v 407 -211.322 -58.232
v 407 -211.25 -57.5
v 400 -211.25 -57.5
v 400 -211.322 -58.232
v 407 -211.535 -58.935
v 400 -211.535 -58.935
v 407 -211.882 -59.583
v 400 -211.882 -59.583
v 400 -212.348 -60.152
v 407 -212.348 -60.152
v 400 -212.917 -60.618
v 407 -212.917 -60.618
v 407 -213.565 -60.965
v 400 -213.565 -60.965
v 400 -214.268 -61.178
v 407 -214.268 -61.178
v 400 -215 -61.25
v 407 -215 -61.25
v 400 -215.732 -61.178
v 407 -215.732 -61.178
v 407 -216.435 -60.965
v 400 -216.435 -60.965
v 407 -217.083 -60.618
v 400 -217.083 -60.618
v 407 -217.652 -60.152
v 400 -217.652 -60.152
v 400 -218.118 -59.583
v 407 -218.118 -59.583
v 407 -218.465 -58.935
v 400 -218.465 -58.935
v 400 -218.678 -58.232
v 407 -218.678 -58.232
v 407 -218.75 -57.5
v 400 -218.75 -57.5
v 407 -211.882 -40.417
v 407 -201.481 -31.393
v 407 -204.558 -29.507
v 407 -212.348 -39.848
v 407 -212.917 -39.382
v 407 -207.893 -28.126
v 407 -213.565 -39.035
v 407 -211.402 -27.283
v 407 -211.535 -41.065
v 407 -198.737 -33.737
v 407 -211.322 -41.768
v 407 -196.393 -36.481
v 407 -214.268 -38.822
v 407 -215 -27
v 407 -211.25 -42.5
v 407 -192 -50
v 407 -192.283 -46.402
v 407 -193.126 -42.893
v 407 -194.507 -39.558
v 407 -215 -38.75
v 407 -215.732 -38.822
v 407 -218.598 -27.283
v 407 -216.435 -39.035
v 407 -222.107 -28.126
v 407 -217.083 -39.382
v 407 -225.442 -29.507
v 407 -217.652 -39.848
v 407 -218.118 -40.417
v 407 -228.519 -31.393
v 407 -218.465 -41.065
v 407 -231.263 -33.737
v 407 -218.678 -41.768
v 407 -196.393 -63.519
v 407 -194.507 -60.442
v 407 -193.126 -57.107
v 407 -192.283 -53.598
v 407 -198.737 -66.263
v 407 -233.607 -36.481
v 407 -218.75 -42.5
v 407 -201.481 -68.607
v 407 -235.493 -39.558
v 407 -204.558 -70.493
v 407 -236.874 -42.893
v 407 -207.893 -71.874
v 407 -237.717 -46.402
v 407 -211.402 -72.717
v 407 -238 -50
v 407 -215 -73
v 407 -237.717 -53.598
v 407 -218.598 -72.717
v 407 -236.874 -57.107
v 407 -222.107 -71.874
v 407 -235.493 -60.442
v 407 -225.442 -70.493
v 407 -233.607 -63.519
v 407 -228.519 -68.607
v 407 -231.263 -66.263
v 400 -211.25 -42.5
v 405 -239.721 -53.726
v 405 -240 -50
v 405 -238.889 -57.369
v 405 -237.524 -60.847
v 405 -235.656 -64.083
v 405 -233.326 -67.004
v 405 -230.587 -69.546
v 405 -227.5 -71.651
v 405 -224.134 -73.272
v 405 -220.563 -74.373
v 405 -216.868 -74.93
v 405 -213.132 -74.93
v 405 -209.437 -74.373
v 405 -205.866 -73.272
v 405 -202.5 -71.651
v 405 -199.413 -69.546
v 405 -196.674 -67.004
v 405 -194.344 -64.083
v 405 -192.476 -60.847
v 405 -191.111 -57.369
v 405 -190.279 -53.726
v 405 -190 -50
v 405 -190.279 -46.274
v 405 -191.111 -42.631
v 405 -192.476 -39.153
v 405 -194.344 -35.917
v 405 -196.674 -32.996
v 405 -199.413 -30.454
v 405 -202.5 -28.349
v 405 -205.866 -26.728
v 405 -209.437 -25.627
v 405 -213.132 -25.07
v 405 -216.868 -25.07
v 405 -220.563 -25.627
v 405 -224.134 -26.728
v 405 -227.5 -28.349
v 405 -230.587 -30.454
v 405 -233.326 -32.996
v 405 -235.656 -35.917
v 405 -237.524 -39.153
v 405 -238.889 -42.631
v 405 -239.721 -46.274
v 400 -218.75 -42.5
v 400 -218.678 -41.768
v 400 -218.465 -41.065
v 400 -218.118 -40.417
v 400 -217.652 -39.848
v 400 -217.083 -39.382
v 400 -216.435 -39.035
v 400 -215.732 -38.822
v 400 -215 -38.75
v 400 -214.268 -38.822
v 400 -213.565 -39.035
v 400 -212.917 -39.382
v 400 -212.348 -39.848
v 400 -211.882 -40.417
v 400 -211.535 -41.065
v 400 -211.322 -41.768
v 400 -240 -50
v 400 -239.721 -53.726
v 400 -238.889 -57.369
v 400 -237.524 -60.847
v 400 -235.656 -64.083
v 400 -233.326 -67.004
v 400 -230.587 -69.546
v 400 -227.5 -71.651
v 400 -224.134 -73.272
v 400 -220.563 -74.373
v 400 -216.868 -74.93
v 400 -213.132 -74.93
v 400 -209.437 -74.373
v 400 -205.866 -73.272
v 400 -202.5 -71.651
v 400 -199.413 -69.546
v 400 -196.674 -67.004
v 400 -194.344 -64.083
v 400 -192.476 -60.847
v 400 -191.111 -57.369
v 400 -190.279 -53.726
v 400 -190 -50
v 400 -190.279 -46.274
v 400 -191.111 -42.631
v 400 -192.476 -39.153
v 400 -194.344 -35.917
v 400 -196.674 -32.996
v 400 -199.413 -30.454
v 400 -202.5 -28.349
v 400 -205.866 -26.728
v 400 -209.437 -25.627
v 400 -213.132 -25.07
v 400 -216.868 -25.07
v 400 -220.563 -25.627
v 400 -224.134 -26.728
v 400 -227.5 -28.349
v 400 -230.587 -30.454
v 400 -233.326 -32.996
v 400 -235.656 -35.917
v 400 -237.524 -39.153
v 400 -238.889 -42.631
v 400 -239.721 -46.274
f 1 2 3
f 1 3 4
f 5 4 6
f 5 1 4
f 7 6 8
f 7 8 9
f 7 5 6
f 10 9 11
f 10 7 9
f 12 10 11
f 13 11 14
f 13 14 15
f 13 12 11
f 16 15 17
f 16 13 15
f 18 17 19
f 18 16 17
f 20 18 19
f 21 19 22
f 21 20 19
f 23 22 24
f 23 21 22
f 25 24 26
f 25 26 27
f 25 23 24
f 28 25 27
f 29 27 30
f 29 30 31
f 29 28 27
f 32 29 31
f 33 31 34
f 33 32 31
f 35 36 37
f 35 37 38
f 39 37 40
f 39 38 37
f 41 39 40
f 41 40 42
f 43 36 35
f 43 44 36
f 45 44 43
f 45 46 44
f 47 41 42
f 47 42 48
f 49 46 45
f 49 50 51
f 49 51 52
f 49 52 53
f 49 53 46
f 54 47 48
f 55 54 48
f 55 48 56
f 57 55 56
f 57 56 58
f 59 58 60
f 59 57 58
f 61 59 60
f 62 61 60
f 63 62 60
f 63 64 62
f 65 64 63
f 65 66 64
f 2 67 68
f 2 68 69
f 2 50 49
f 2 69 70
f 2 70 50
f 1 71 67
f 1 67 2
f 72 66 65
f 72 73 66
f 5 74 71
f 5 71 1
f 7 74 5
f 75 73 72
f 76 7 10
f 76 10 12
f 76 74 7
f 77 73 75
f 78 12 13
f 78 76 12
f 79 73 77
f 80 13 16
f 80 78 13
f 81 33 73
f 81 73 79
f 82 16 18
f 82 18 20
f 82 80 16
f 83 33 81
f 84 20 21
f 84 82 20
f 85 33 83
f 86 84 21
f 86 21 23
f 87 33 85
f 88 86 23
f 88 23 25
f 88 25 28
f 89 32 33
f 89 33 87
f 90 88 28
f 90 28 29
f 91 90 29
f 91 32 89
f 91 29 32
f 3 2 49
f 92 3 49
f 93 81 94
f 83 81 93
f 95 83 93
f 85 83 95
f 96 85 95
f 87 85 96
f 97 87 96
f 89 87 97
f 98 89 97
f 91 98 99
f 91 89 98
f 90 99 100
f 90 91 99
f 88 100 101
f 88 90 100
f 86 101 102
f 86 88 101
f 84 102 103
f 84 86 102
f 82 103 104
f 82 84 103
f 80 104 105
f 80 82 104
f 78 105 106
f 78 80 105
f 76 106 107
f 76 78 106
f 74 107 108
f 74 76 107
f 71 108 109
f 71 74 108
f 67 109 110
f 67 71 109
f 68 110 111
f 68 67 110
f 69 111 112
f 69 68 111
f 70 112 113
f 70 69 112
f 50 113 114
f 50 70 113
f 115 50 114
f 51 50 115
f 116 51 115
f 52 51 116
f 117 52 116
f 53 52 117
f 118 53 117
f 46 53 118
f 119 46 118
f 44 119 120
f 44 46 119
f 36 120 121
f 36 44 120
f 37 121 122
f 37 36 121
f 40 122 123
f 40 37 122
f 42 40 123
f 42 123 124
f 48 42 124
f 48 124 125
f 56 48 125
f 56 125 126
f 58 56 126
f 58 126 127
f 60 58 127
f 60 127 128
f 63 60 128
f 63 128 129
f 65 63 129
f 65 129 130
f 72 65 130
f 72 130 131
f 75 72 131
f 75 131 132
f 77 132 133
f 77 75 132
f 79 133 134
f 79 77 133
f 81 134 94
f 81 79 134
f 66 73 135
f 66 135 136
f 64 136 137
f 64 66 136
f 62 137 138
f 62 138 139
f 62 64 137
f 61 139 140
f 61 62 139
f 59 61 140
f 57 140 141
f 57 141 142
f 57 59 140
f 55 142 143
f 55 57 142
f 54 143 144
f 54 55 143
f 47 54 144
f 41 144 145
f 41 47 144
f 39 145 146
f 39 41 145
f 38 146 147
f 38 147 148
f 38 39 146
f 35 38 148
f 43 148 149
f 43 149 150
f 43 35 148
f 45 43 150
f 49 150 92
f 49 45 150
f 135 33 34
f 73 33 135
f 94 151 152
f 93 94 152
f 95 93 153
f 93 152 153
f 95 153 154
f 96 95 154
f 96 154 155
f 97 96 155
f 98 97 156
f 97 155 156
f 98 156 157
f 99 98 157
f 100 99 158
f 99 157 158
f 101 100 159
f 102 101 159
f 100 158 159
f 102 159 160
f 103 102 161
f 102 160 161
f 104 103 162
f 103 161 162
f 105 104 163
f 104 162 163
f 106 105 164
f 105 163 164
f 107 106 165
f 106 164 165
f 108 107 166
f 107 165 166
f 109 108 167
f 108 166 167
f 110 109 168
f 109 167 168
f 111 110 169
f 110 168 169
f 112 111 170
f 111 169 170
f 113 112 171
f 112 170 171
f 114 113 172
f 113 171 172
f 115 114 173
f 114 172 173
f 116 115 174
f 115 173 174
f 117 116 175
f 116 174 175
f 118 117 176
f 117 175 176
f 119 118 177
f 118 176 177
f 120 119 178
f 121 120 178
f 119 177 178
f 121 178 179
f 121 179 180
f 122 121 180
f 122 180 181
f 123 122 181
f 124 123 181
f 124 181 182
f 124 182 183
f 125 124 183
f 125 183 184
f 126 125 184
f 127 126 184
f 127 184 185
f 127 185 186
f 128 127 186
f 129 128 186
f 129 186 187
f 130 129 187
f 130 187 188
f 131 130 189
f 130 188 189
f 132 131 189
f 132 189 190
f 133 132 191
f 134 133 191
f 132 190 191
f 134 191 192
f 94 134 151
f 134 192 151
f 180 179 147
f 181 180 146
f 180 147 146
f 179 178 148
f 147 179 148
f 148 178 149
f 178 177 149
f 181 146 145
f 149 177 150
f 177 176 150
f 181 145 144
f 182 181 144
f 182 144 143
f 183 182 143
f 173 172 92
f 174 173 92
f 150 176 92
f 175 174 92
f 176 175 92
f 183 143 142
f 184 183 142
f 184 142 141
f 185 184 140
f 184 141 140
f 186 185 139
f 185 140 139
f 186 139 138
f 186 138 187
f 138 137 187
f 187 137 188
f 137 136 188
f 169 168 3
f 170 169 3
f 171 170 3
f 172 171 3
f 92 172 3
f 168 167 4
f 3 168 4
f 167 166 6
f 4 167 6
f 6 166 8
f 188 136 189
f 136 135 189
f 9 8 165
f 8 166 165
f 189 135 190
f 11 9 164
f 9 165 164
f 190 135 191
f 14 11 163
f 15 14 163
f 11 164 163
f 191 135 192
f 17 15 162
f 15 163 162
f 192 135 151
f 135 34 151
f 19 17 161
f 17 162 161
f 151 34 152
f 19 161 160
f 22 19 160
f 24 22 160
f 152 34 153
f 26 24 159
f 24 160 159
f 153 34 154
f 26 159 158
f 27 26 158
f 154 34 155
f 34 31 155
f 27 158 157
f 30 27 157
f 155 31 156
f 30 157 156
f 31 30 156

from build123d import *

# Parameters (mm, degrees)
EXTRUDE020_DEPTH         = 10
CIRCLE002_R              = 25
EXTRUDE019_DEPTH         = 7
CHAMFER002_SIZE          = 2
CLONE033_ROLL_ANGLE      = 180
CLONE033_PLACEMENT_ANGLE = -90


with BuildPart() as extrude020:
    # Sketch030 (on Face4 of Chamfer002) → Extrude020 (new body, symmetric)
    with BuildSketch(Plane(origin=(0, 7, 0), x_dir=(-1, 0, 0), z_dir=(0, 1, 0))):
        with BuildLine():
            ThreePointArc((3.75, 7.5), (0, 11.25), (-3.75, 7.5))
            Line((-3.75, 7.5), (-3.75, -7.5))
            ThreePointArc((-3.75, -7.5), (0, -11.25), (3.75, -7.5))
            Line((3.75, 7.5), (3.75, -7.5))
        make_face()
    extrude(amount=EXTRUDE020_DEPTH, both=True)


with BuildPart() as lock_right_external:
    # Circle002 → Extrude019 (new body)
    with BuildSketch(Plane.XZ):
        Circle(CIRCLE002_R)
    extrude(amount=-EXTRUDE019_DEPTH)

    # Chamfer002
    chamfer002_edges = [lock_right_external.edges().sort_by_distance(p)[0] for p in [
        (-25, 7, 0),
    ]]
    chamfer(chamfer002_edges, length=CHAMFER002_SIZE)

    # Cut004: cut Extrude020
    add(extrude020.part, mode=Mode.SUBTRACT)


with BuildPart() as lock_right_external_1:
    # Cut004 placement: moved
    add(lock_right_external.part.moved(Location((0, 0, -83.343755))))


with BuildPart() as lock_right_external_2:
    # Clone033 roll: moved
    add(lock_right_external_1.part.rotate(Axis((0, 0, 0), (1, 0, 0)), CLONE033_ROLL_ANGLE))


with BuildPart() as lock_right_external_3:
    # Clone033 placement: moved
    add(lock_right_external_2.part.moved(Location((-400, -215, -133.343755))).rotate(Axis((-400, -215, -133.343755), (0, 0, 1)), CLONE033_PLACEMENT_ANGLE))


with BuildPart() as mirror172:
    # Mirror172: instance of Lock_right_external
    add(lock_right_external_3.part.mirror(Plane(origin=(0, 0, 0), x_dir=(0, -1, 0), z_dir=(1, 0, 0))))


solid = mirror172.part
